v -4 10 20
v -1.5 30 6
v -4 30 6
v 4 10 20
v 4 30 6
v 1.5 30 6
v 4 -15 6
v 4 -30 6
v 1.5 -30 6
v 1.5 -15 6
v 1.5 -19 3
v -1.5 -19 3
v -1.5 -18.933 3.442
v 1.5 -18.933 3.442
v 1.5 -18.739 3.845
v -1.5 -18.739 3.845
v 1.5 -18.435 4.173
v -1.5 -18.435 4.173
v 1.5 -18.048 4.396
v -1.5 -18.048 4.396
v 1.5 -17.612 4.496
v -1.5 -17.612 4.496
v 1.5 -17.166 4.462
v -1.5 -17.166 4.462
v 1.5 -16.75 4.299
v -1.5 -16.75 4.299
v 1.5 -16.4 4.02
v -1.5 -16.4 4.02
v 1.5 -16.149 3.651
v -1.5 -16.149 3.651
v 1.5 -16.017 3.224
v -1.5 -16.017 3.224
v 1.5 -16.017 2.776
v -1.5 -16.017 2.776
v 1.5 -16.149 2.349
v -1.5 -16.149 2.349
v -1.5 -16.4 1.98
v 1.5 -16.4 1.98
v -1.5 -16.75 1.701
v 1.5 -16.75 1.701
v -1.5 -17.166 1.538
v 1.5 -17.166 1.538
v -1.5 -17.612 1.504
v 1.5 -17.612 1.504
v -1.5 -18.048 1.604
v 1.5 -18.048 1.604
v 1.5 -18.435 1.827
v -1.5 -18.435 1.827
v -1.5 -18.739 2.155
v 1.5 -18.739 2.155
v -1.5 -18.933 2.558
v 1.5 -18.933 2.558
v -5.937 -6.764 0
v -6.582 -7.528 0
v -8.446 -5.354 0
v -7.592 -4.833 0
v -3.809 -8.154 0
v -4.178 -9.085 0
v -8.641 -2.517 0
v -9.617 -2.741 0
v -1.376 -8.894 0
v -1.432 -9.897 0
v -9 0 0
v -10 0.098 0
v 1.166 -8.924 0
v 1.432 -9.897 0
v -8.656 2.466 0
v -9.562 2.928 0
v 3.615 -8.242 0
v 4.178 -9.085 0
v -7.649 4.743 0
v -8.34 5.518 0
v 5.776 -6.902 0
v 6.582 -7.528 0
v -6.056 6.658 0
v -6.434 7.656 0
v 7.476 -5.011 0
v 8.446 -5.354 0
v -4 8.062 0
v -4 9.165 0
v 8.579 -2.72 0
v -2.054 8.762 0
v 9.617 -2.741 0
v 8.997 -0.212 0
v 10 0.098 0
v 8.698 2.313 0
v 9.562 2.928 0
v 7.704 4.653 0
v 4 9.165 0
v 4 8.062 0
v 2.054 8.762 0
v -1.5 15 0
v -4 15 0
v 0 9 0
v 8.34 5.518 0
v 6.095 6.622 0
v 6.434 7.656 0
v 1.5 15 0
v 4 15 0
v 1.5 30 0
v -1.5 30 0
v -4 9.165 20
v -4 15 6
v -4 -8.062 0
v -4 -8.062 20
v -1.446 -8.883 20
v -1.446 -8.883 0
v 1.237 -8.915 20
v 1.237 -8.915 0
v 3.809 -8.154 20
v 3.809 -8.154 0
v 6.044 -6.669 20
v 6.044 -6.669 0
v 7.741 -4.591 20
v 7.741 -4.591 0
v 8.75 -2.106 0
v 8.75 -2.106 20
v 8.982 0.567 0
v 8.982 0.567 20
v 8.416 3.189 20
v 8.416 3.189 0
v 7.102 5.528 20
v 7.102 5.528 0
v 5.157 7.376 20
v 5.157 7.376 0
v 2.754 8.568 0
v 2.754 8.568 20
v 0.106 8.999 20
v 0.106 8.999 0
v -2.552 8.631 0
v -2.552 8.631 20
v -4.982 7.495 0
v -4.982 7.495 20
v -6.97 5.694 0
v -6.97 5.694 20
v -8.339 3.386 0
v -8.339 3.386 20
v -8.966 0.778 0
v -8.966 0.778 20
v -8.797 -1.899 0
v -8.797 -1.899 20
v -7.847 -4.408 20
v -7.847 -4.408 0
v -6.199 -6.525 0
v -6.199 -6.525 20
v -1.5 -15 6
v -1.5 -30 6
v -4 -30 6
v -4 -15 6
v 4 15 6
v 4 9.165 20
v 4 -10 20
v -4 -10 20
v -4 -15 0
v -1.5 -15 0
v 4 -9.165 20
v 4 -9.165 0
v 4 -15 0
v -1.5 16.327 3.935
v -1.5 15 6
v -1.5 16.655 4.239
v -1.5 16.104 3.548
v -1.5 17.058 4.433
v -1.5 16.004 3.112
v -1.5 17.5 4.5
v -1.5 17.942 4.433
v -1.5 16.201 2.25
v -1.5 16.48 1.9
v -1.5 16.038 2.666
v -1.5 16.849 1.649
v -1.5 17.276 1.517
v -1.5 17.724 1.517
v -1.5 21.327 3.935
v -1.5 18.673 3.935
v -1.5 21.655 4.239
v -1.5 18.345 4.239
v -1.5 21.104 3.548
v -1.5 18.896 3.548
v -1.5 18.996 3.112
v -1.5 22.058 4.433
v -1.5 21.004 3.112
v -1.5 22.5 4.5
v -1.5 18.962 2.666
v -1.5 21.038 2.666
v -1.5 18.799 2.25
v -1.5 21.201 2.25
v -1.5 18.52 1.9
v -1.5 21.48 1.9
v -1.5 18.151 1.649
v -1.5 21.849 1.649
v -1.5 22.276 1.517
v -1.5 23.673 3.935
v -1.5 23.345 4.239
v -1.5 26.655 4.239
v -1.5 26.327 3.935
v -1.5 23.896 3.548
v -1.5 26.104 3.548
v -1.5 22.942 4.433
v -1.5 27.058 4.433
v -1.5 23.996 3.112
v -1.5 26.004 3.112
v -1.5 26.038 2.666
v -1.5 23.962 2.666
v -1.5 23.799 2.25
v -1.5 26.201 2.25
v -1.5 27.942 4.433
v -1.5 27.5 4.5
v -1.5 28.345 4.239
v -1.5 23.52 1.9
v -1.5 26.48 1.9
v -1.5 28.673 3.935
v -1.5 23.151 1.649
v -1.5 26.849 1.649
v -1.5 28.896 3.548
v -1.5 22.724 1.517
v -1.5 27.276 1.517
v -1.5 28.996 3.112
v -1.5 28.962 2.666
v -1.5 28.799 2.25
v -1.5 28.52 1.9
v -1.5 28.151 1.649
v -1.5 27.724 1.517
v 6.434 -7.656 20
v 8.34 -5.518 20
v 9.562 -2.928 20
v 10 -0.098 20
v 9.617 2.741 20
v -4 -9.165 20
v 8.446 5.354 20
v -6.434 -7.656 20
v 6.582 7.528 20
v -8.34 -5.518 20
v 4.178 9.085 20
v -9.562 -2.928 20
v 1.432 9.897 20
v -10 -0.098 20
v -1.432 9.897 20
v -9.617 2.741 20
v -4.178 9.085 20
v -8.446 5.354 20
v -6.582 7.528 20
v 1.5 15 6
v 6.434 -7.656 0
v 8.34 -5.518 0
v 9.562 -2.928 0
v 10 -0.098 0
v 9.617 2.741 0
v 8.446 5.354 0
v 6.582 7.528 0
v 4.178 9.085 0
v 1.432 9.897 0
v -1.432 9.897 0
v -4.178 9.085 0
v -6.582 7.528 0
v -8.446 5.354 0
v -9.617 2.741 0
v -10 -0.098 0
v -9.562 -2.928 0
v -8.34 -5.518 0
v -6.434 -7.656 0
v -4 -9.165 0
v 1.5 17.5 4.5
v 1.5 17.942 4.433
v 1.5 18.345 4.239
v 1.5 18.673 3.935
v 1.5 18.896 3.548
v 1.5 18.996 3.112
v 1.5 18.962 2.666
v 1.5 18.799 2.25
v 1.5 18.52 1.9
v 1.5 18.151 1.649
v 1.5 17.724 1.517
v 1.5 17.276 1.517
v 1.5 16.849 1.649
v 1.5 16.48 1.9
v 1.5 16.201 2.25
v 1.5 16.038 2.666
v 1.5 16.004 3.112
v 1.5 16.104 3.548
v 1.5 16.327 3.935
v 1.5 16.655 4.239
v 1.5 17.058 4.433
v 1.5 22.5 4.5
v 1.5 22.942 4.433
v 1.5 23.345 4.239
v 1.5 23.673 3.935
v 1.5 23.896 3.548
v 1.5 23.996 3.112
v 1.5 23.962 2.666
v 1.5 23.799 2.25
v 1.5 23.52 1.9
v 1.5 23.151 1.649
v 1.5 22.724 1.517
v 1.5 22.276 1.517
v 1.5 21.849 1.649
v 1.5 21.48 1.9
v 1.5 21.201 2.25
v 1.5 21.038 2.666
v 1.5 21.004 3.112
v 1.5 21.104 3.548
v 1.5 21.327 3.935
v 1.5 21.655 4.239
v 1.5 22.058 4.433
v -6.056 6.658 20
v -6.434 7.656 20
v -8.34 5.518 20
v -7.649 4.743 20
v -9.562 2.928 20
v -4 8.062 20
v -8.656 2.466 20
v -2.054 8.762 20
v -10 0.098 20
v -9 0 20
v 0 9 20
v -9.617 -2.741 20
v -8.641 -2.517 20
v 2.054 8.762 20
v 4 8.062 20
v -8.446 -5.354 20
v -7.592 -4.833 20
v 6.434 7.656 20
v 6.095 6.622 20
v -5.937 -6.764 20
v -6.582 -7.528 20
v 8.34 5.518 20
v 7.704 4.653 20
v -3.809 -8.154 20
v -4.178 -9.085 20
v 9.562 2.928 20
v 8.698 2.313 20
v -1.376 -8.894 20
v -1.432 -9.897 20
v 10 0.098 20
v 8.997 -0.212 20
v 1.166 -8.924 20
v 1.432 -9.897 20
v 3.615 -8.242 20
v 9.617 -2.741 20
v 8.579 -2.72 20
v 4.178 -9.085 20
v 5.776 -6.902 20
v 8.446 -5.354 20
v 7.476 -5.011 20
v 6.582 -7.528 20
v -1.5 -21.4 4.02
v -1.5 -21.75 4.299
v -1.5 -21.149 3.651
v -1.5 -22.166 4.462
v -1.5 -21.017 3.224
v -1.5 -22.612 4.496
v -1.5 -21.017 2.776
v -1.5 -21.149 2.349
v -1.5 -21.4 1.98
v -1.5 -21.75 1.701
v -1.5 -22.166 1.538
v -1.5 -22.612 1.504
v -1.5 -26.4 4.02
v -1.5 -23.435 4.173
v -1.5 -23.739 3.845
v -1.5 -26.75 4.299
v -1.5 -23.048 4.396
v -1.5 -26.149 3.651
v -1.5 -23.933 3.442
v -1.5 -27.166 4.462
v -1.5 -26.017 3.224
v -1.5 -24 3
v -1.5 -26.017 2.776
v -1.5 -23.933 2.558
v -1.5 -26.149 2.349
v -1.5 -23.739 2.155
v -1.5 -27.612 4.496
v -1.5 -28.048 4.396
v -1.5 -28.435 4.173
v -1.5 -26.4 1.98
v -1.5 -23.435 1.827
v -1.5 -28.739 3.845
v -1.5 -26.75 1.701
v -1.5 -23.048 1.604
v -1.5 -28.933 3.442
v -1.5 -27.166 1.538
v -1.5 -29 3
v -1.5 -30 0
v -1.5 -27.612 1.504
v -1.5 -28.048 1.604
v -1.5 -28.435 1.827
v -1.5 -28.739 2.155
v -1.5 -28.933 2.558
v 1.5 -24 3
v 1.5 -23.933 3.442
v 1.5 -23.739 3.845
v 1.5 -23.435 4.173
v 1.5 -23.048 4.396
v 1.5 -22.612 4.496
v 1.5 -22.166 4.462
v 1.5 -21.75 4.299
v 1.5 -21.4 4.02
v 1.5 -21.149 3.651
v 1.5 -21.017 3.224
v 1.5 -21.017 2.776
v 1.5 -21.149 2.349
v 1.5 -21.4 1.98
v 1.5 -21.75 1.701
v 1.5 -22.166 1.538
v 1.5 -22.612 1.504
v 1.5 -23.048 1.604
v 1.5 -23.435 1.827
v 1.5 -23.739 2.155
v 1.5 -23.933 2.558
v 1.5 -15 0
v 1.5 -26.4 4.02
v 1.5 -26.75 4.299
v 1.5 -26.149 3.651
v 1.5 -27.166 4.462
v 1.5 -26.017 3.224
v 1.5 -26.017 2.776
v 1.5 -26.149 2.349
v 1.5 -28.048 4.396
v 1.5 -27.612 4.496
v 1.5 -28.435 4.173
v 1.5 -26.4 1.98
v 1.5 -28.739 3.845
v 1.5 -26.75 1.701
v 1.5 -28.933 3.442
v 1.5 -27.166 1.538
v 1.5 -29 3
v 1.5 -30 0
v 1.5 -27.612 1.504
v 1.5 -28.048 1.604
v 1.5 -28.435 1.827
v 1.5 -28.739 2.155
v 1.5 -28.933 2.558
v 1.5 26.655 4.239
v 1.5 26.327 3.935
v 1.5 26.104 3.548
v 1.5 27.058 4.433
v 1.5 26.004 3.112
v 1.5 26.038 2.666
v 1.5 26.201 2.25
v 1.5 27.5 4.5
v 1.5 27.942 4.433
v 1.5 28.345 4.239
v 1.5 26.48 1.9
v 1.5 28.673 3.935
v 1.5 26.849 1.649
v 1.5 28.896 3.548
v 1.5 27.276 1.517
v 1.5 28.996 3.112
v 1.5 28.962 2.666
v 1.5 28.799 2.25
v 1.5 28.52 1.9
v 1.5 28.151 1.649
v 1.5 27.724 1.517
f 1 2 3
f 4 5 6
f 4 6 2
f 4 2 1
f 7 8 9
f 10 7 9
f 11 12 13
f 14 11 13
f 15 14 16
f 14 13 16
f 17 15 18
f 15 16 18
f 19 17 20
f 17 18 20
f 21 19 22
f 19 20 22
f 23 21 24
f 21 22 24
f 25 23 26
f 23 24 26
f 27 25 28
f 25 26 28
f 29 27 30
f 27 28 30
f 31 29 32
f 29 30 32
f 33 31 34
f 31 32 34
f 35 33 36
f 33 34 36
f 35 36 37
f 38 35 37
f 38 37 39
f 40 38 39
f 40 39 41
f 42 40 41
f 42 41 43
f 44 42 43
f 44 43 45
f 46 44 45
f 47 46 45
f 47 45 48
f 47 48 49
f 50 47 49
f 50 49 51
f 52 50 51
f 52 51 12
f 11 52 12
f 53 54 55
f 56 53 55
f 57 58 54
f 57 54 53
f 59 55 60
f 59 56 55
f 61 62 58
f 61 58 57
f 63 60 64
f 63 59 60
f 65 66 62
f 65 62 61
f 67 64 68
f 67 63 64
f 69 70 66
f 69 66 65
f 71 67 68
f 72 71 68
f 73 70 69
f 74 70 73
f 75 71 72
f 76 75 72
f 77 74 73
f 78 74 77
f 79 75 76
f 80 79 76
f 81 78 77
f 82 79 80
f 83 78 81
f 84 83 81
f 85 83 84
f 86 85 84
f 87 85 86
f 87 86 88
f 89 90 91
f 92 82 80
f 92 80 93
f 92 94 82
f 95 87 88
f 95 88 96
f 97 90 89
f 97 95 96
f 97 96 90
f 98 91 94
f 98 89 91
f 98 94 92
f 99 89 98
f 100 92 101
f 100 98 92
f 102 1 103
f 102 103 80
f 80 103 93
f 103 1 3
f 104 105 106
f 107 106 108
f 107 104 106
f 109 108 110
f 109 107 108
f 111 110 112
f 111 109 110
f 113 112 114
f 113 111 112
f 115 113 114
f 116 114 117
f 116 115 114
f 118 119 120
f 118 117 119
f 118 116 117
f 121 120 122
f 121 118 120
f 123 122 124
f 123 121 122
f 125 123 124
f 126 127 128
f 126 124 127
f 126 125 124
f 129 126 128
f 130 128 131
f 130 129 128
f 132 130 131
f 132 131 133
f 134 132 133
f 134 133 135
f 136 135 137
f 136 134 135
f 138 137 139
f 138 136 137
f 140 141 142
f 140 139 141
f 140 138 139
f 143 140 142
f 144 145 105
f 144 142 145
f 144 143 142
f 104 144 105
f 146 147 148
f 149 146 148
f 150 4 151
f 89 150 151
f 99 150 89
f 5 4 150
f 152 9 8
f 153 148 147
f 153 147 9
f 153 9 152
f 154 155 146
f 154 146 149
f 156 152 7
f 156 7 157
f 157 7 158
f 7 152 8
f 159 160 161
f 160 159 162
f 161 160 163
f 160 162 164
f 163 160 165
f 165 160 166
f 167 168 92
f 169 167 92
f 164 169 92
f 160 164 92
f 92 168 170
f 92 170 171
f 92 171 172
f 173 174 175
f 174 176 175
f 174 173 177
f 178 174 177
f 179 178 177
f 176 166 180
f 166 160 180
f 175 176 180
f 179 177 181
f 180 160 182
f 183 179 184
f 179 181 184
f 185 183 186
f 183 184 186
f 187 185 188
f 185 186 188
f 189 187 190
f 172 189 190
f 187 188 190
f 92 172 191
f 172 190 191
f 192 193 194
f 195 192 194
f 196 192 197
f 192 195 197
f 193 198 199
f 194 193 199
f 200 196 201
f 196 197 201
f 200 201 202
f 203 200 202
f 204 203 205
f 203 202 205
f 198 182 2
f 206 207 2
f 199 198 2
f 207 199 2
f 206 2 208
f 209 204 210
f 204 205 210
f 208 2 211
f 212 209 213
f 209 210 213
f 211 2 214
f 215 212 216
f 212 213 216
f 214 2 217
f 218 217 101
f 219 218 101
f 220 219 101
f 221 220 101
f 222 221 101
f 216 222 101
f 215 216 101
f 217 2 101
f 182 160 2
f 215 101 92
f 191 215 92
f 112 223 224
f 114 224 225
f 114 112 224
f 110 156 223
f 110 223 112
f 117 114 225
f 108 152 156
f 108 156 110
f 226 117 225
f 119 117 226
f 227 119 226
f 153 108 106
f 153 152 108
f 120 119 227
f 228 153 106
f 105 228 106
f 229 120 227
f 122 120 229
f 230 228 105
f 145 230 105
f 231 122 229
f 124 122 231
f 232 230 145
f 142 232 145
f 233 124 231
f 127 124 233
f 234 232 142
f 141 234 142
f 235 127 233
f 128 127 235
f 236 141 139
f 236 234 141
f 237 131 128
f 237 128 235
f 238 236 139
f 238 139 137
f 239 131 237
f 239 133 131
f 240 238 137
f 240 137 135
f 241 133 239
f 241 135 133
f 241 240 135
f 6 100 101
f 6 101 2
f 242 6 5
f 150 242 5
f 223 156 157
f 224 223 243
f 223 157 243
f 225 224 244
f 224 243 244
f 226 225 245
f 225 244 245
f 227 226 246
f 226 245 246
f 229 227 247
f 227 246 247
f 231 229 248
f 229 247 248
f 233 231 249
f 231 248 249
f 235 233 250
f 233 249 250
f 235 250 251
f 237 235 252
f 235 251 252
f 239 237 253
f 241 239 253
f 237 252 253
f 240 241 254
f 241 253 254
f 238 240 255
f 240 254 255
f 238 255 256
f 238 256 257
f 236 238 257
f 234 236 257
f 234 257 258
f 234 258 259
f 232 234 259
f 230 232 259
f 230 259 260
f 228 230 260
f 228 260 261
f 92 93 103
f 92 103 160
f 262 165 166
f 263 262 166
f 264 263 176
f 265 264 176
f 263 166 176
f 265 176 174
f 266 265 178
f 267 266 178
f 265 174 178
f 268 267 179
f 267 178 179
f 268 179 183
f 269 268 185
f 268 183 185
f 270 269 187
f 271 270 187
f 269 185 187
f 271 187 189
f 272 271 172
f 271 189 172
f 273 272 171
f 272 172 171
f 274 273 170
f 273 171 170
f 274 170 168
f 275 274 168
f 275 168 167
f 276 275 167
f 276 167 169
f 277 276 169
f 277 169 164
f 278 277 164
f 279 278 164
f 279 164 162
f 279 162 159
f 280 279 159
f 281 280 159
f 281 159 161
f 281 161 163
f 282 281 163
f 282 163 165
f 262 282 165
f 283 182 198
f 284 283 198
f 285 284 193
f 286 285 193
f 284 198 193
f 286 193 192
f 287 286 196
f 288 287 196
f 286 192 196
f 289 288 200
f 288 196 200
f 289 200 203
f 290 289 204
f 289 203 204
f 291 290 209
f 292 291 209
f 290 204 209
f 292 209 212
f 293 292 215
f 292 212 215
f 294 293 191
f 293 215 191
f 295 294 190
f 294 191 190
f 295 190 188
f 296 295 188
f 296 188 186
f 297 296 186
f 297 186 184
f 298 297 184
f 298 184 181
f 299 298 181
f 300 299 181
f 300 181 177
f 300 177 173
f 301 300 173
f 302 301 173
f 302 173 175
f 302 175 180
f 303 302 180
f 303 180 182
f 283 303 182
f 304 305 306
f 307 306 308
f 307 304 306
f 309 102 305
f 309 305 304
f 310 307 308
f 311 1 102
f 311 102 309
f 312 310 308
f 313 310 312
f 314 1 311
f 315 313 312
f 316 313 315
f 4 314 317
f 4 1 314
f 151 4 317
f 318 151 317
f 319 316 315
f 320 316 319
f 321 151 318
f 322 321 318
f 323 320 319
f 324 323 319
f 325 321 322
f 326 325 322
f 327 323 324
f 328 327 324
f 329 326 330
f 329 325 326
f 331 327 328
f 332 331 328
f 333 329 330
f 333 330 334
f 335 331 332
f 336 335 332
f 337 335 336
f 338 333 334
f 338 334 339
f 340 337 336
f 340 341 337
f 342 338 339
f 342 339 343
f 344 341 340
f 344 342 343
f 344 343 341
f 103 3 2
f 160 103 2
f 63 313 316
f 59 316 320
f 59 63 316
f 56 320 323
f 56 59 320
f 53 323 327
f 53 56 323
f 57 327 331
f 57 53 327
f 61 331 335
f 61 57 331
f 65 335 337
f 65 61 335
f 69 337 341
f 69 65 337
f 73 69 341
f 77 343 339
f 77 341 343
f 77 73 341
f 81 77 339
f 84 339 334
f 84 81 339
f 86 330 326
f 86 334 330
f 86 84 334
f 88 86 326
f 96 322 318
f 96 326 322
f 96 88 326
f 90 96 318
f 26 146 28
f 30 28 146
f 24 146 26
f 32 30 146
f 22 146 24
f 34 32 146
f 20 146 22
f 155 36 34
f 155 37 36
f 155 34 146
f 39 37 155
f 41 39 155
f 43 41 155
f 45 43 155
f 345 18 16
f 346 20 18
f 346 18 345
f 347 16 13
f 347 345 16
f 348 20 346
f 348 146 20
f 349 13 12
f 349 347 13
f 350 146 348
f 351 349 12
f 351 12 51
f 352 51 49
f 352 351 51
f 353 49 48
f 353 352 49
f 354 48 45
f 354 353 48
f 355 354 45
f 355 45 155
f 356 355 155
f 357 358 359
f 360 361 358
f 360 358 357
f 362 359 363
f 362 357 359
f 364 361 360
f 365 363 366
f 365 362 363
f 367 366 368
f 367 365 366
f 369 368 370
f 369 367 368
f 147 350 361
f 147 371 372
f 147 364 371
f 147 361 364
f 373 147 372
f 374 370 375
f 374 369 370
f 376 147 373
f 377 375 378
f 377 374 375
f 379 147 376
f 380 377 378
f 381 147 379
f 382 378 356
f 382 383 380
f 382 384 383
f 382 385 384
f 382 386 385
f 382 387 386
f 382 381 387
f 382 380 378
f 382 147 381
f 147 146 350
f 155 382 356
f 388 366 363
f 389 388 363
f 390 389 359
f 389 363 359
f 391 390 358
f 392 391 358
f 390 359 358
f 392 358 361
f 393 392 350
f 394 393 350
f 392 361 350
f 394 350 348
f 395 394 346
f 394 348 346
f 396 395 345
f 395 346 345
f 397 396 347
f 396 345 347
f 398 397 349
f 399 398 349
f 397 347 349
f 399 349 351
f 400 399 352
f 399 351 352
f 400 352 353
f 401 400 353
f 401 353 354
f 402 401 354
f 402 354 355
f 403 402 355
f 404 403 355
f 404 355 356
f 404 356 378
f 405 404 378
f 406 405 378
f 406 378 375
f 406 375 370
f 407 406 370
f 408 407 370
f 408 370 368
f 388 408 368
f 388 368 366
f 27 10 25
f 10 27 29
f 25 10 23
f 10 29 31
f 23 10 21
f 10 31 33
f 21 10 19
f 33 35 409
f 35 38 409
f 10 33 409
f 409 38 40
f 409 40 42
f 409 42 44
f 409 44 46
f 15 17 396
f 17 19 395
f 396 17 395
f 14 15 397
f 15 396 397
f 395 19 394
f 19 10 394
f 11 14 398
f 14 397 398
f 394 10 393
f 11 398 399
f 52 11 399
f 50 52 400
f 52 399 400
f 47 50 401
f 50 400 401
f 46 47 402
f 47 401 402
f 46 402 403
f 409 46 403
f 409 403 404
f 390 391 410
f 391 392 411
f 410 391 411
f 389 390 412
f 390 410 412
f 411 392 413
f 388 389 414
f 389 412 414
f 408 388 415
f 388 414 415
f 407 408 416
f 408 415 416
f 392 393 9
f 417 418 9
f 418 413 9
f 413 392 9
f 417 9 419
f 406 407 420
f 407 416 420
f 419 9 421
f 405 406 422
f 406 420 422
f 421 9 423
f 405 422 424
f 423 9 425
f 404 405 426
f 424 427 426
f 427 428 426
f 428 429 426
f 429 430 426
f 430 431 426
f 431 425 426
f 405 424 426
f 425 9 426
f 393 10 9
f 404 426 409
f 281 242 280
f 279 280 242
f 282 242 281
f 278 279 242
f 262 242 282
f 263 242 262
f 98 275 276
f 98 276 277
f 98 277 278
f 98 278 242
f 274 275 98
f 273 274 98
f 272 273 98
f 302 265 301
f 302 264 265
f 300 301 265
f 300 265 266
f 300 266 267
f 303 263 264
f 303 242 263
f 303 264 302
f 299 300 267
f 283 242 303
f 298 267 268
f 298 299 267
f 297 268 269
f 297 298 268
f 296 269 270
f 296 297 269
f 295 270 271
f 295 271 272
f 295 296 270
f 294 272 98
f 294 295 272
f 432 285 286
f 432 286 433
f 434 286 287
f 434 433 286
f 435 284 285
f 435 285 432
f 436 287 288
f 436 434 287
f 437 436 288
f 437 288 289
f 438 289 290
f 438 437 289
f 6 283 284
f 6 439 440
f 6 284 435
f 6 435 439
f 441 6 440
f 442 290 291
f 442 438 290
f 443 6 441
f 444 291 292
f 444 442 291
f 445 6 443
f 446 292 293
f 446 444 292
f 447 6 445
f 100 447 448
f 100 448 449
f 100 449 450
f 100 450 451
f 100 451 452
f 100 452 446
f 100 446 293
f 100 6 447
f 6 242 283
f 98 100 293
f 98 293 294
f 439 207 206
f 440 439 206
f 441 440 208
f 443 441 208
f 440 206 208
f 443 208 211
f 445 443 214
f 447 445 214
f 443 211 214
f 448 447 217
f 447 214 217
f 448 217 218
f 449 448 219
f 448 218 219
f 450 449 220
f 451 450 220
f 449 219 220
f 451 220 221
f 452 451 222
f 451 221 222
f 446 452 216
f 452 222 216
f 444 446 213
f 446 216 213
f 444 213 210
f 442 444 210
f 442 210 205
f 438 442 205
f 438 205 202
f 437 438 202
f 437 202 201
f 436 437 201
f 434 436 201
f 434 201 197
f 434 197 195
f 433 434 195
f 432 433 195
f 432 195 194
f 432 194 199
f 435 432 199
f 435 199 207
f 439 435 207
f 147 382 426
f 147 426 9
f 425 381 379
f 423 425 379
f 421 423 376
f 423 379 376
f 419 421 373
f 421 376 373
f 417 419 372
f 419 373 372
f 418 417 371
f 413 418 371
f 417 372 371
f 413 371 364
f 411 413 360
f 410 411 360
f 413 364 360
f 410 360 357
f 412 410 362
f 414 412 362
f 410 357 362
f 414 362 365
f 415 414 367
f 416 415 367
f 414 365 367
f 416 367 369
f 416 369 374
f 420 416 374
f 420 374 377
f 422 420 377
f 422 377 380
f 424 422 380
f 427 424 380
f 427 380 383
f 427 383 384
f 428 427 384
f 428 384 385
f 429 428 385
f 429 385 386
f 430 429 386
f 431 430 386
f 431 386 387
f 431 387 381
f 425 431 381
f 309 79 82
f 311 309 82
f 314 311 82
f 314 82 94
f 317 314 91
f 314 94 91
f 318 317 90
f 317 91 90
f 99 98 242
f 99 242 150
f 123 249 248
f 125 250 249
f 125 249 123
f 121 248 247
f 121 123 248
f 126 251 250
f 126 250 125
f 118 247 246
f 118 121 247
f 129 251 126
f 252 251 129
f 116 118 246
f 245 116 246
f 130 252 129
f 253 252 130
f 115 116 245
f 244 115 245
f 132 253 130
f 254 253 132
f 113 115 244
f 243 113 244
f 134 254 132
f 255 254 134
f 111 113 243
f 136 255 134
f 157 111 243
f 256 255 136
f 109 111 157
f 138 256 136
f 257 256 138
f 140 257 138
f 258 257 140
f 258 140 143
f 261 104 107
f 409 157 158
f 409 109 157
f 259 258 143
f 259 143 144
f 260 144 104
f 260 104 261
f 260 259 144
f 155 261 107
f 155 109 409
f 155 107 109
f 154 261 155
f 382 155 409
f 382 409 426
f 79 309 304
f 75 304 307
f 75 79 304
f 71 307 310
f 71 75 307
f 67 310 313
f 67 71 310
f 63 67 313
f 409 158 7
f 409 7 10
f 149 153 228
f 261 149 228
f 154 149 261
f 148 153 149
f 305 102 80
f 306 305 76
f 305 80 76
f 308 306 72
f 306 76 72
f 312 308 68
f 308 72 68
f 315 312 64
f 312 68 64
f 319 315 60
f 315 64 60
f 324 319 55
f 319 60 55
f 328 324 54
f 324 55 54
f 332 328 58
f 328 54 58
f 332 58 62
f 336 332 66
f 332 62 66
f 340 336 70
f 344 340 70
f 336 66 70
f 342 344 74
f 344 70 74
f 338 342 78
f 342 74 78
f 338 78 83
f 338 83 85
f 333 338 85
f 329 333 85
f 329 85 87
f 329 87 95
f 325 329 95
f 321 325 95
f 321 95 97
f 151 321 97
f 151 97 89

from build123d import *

# Parameters (mm, degrees)
SKETCH1_R             = 10
SKETCH1_R_2           = 9
BOSS_EXTRUDE1_DEPTH   = 20
BOSS_EXTRUDE2_DEPTH   = 4
SKETCH3_W             = 2.5
SKETCH3_H             = 6
CUT_EXTRUDE1_DEPTH    = 15
BODY_MOVE_COPY1_ANGLE = 180
SKETCH4_R             = 9
CUT_EXTRUDE2_DEPTH    = 38.416573868
SKETCH6_R             = 1.5
CUT_EXTRUDE3_DEPTH    = 38.84507894
SKETCH7_R             = 1.5
CUT_EXTRUDE4_DEPTH    = 38.84507894


with BuildPart() as part:
    # Sketch1 → Boss-Extrude1 (new body)
    with BuildSketch(Plane.XY):
        Circle(SKETCH1_R)
        Circle(SKETCH1_R_2, mode=Mode.SUBTRACT)
    extrude(amount=BOSS_EXTRUDE1_DEPTH)

    # Sketch2 → Boss-Extrude2 (add, symmetric)
    with BuildSketch(Plane(origin=(0, 0, 0), x_dir=(0, 0, -1), z_dir=(1, 0, 0))):
        Polygon((-20, 10), (-20, 6.5), (0, 6.5), (0, 30), (-6, 30), align=None)
    extrude(amount=BOSS_EXTRUDE2_DEPTH, both=True)

    # Sketch3 → Cut-Extrude1 (cut)
    with BuildSketch(Plane(origin=(0, 30, 0), x_dir=(1, 0, 0), z_dir=(0, 1, 0))):
        with Locations((-2.75, -3)):
            Rectangle(SKETCH3_W, SKETCH3_H)
        with Locations((2.75, -3)):
            Rectangle(SKETCH3_W, SKETCH3_H)
    extrude(amount=-CUT_EXTRUDE1_DEPTH, mode=Mode.SUBTRACT)


with BuildPart() as body_2:
    # Body-Move/Copy1: copy of part
    add(part.part.rotate(Axis((0, 0, 0), (0, 0, 1)), BODY_MOVE_COPY1_ANGLE))


with BuildPart() as cut_extrude2_tool:
    # Sketch4 → Cut-Extrude2 (new, through all)
    with BuildSketch(Plane(origin=(0, 0, 0), x_dir=(-1, 0, 0), z_dir=(0, 0, -1))):
        Circle(SKETCH4_R)
    extrude(amount=-CUT_EXTRUDE2_DEPTH)


with BuildPart() as part_1:
    add(part.part)

    # Cut-Extrude2: cut by cut_extrude2_tool
    add(cut_extrude2_tool.part, mode=Mode.SUBTRACT)

    # Sketch6 → Cut-Extrude3 (cut, through all)
    with BuildSketch(Plane.ZY.offset(1.5)):
        with Locations((3, 17.5)):
            Circle(SKETCH6_R)
        with Locations((3, 22.5)):
            Circle(SKETCH6_R)
        with Locations((3, 27.5)):
            Circle(SKETCH6_R)
    extrude(amount=-CUT_EXTRUDE3_DEPTH, mode=Mode.SUBTRACT)


with BuildPart() as body_2_1:
    add(body_2.part)

    # Cut-Extrude2: cut by cut_extrude2_tool
    add(cut_extrude2_tool.part, mode=Mode.SUBTRACT)

    # Sketch7 → Cut-Extrude4 (cut, through all)
    with BuildSketch(Plane.ZY.offset(1.5)):
        with Locations(Location((3, -17.5, 0), (0, 0, 270))):
            Circle(SKETCH7_R)
        with Locations(Location((3, -22.5, 0), (0, 0, 270))):
            Circle(SKETCH7_R)
        with Locations(Location((3, -27.5, 0), (0, 0, 270))):
            Circle(SKETCH7_R)
    extrude(amount=-CUT_EXTRUDE4_DEPTH, mode=Mode.SUBTRACT)


solid = Compound([part_1.part, body_2_1.part])
